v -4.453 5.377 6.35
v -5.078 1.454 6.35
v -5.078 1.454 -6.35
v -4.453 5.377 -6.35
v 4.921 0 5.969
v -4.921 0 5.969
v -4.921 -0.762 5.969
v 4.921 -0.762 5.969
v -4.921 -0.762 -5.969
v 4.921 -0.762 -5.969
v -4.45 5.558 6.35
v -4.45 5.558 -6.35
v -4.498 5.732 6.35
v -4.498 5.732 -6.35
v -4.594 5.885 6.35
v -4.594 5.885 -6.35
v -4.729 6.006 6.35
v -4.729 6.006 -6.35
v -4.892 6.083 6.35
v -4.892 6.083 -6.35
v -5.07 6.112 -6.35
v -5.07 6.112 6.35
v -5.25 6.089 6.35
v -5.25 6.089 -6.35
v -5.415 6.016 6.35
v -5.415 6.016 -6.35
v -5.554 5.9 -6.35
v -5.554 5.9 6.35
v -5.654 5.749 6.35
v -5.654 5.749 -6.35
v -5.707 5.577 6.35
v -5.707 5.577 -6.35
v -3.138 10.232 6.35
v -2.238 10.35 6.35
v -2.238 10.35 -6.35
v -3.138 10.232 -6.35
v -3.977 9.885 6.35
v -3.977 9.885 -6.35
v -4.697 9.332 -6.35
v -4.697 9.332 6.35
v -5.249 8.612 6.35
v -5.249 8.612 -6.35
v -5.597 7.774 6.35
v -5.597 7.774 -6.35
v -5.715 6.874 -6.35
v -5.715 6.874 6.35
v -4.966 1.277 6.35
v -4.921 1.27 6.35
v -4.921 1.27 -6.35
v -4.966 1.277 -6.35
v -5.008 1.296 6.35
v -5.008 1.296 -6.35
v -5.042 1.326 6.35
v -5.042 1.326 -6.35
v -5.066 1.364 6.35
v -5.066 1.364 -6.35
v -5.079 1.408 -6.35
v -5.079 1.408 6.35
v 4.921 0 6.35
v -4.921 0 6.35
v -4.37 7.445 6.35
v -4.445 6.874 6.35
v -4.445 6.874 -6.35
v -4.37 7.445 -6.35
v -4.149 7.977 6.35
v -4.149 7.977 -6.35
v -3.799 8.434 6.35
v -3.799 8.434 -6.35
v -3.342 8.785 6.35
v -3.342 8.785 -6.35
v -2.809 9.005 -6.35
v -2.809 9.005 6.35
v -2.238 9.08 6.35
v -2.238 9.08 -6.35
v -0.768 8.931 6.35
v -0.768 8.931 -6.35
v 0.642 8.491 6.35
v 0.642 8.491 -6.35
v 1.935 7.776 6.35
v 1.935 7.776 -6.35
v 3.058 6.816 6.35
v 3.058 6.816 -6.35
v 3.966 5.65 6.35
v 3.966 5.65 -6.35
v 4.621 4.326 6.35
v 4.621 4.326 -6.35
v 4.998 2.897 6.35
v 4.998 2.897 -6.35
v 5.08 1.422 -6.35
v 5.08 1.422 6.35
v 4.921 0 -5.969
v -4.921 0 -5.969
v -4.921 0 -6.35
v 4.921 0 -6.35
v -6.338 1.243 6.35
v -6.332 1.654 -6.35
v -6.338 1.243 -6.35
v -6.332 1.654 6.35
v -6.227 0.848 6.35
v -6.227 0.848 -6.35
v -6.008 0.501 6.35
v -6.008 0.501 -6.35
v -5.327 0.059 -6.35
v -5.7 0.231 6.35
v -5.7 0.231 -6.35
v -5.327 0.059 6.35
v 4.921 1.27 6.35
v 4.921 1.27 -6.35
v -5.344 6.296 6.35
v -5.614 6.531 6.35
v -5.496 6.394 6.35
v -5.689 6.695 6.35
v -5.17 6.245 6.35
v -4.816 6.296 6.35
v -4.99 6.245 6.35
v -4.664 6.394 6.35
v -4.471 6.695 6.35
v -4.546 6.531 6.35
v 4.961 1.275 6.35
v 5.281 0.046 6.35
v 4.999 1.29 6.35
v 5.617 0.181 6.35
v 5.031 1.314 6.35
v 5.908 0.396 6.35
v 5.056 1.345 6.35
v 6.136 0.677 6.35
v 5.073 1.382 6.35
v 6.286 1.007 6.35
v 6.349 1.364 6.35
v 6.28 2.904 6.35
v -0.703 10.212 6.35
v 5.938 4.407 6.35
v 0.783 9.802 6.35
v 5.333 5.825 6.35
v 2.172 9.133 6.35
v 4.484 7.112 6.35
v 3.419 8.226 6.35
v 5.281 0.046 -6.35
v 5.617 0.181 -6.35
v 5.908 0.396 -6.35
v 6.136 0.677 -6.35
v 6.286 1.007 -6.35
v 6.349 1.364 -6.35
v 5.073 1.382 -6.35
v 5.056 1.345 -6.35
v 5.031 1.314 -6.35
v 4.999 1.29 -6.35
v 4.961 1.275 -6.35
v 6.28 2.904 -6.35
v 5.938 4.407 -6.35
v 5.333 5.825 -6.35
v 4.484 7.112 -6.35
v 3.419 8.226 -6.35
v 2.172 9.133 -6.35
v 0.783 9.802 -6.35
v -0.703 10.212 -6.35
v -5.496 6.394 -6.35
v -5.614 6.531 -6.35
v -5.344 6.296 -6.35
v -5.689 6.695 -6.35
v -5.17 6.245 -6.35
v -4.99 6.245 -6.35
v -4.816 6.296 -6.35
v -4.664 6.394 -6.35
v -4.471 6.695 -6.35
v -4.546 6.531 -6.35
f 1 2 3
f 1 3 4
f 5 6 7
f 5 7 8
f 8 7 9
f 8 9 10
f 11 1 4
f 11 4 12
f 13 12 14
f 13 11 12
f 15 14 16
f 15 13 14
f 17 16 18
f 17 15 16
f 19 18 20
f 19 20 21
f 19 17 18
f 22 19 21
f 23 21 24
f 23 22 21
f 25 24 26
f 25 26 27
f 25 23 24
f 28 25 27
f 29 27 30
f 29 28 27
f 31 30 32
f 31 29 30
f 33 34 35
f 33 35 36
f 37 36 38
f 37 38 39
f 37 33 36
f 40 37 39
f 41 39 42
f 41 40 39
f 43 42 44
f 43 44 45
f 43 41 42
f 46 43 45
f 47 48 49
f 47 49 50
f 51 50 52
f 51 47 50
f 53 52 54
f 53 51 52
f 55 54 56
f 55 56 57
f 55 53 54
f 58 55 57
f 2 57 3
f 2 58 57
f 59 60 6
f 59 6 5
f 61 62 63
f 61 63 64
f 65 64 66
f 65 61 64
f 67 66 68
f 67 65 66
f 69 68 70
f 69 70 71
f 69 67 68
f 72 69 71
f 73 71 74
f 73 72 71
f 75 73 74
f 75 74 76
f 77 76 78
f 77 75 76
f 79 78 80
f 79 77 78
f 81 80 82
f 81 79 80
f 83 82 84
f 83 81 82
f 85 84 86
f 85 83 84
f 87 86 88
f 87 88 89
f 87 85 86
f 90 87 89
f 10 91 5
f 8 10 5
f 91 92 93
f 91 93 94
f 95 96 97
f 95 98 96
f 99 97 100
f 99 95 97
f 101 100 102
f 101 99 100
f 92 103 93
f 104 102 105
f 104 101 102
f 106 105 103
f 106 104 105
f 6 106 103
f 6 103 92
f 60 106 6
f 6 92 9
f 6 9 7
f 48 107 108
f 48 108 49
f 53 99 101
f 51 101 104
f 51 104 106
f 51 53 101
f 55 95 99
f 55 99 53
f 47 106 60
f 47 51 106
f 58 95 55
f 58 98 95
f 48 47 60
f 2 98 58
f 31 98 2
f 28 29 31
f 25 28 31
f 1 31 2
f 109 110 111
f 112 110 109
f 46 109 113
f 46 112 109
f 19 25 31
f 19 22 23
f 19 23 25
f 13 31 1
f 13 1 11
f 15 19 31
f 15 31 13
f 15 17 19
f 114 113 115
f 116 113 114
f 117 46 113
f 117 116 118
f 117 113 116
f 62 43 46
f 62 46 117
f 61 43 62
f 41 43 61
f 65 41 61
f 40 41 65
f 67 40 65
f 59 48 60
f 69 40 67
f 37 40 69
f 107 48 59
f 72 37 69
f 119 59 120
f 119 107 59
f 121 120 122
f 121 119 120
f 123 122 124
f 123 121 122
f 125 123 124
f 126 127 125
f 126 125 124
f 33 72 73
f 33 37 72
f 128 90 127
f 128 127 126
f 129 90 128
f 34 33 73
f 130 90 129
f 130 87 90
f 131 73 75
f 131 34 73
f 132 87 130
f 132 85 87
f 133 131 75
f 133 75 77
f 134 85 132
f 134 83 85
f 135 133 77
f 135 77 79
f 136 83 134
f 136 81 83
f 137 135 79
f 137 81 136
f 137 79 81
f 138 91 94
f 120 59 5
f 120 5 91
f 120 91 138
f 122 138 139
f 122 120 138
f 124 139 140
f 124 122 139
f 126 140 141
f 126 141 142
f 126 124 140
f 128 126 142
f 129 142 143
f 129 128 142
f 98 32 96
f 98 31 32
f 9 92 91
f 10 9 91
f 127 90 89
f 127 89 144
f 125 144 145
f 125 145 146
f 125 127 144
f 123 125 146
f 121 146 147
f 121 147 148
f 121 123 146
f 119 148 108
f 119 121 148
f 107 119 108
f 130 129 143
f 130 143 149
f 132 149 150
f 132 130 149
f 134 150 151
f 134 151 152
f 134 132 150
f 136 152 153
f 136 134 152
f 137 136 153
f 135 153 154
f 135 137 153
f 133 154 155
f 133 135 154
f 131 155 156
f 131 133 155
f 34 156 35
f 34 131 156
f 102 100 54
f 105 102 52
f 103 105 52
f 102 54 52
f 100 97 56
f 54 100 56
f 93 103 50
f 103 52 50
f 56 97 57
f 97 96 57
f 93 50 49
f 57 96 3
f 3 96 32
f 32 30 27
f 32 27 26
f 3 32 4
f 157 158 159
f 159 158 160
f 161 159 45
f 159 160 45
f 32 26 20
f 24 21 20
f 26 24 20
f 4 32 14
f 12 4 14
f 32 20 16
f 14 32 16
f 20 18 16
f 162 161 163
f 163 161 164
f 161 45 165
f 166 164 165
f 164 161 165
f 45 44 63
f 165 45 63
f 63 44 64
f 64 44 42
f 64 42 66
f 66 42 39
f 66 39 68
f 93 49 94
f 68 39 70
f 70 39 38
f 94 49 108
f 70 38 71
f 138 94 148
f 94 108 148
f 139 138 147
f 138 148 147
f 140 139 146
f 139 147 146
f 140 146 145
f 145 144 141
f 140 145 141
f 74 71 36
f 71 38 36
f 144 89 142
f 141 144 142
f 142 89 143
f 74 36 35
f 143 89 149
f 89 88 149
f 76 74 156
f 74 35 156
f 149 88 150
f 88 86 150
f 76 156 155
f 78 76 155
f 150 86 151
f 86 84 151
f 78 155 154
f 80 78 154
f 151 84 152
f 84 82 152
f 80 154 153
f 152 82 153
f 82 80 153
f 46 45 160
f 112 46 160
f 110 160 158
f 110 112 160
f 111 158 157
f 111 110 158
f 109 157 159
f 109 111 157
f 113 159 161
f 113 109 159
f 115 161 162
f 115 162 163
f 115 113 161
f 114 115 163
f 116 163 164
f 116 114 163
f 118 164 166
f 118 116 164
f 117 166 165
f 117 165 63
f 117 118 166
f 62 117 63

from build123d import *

# Parameters (mm, degrees)
BOSS_EXTRUDE3_DEPTH      = 6.35
BOSS_EXTRUDE3_DEPTH_BACK = 6.35
SKETCH6_W                = 9.8425
SKETCH6_H                = 11.938
BOSS_EXTRUDE4_DEPTH      = 0.762


with BuildPart() as part:
    # Sketch5 → Boss-Extrude3 (new body, two sides)
    with BuildSketch(Plane.XY) as boss_extrude3_sk:
        with BuildLine():
            Line((-4.92125, 0), (4.92125, 0))
            ThreePointArc((4.92125, 0), (5.908287619, 0.395752758), (6.348521584, 1.363770094))
            ThreePointArc((6.348521584, 1.363770094), (3.976448154, 7.693025011), (-2.238375, 10.3505))
            ThreePointArc((-2.238375, 10.3505), (-4.696720113, 9.332220113), (-5.715, 6.873875))
            ThreePointArc((-5.715, 6.873875), (-5.08, 6.238875), (-4.445, 6.873875))
            ThreePointArc((-4.445, 6.873875), (-3.798694501, 8.434194501), (-2.238375, 9.0805))
            ThreePointArc((-2.238375, 9.0805), (3.058228384, 6.815658238), (5.079835732, 1.42153001))
            ThreePointArc((5.079835732, 1.42153001), (5.030920847, 1.313972529), (4.92125, 1.27))
            Line((4.92125, 1.27), (-4.92125, 1.27))
            ThreePointArc((-4.92125, 1.27), (-5.042012288, 1.325706163), (-5.078022403, 1.453729514))
            Line((-5.078022403, 1.453729514), (-4.452910387, 5.376956946))
            ThreePointArc((-4.452910387, 5.376956946), (-4.980081946, 6.103964613), (-5.707089613, 5.576793054))
            Line((-5.707089613, 5.576793054), (-6.332201629, 1.653565622))
            ThreePointArc((-6.332201629, 1.653565622), (-6.00811059, 0.501355466), (-4.92125, 0))
        make_face()
    extrude(amount=BOSS_EXTRUDE3_DEPTH)
    extrude(boss_extrude3_sk.sketch, amount=-BOSS_EXTRUDE3_DEPTH_BACK)

    # Sketch6 → Boss-Extrude4 (add)
    with BuildSketch(Plane.XZ):
        Rectangle(SKETCH6_W, SKETCH6_H)
    extrude(amount=BOSS_EXTRUDE4_DEPTH)


solid = part.part
